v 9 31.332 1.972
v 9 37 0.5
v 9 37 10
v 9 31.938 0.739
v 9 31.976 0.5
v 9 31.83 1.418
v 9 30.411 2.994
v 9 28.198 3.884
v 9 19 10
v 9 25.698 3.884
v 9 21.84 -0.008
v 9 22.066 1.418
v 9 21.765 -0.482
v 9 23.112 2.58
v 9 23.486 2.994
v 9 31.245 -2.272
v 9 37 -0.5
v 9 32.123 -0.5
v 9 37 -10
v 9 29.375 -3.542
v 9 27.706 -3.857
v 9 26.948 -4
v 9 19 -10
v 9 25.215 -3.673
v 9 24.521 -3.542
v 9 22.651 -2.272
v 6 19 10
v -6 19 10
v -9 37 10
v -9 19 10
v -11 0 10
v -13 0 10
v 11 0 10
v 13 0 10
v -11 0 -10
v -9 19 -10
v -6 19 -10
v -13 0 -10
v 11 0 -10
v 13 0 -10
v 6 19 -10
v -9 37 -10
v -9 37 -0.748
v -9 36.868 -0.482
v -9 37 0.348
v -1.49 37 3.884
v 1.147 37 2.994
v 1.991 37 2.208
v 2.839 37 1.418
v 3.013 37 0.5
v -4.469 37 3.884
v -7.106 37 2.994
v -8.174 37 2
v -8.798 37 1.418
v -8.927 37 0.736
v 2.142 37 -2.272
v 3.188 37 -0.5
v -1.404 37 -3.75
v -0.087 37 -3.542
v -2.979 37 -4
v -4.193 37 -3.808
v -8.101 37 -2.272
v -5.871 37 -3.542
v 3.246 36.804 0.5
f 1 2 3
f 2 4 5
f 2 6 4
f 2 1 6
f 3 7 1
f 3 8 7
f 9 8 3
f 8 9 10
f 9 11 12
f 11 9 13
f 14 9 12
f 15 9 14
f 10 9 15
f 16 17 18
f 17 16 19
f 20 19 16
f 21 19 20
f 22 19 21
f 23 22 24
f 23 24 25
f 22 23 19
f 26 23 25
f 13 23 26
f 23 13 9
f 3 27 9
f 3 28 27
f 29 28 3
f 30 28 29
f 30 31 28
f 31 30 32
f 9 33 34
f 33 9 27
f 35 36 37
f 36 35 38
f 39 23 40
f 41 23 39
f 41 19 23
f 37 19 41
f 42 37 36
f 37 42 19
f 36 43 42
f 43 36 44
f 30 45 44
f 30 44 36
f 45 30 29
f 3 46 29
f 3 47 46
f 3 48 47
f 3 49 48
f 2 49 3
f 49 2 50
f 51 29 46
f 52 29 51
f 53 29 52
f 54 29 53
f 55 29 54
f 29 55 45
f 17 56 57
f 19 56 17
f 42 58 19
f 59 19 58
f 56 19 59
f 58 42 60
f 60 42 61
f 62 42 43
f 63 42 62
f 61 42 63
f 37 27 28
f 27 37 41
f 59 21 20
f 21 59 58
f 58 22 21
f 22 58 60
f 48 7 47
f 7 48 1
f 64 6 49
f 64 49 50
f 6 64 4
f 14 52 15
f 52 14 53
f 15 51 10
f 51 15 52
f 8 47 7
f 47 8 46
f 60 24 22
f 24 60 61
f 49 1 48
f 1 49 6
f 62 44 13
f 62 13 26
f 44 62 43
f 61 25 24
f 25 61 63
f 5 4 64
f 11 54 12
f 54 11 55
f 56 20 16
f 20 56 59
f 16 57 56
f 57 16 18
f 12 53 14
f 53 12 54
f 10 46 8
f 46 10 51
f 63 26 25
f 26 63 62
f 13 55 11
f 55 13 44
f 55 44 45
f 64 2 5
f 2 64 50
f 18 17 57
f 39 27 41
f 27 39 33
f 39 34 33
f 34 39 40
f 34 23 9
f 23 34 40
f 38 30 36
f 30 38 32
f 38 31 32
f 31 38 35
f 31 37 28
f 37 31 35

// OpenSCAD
 
 module base(){
 linear_extrude(height = 20, center = true, convexity = 10, twist = 0)
  polygon( points=[ 
  [-11,0], //0
  [-13,0], //1
  [-9,19], //2
  
  [-34,19], //3
  [-32,35], //4
  
  [-32,35], //5
  [-32,21], //6
  [8,21], //7 
  [8,25], //8
  [10,25], //9
  
  [10,19], //10
  [9,19], //11
  [13,0], //12
  [11,0], //13
  [6,19], //14
  
  [-6,19], //15
  
  [-9,21], //16
  [9,21]], //17
  
  
  //paths=[[0,1,2,3,4,5,6,7,8,9,10,11,12,13,14,15]],convexity=10);
  
  paths=[[0,1,2,16,17,11,12,13,14,15]],
  convexity=10);
  }//mod
  
module tubus(){
    difference(){
        difference(){
            cylinder(h=15,d=9.5,center=true);
            cylinder(h=15,d=8.0,center=true);
            }//diff
    translate ([0,4.5,0]) cube([1,3,15],center=true);
        }//diff
    }//mod
    
module support(){
 linear_extrude(height = 5, center = true, convexity = 10, twist = 0)
  polygon( points=[ 
  
  [0,0], //
  [-9.5,0], //
  [-9.5,9.5]], //
   
  
  paths=[[0,1,2,0]], convexity=10);
    
    }//mod
    
module supporttubus(){
    difference(){
        difference(){
            cube([18,18,20],center=true);                
            translate ([0,6.5,0]) rotate ([0,90,-40]) cylinder(h=60,d=8.0,center=true);
        }//diff
    color("Red")translate ([7,7,0]) cube([10,10,1],center=true);    
    }//diff outer
    
    }//mod
    
    
    base();
    /*
    translate([7.1,25,-0]) rotate ([0,90,-45]) translate ([0,0,-4]) tubus();
    translate([6,20,0]) support();
    */
    translate([-0.0,28,0])supporttubus();
